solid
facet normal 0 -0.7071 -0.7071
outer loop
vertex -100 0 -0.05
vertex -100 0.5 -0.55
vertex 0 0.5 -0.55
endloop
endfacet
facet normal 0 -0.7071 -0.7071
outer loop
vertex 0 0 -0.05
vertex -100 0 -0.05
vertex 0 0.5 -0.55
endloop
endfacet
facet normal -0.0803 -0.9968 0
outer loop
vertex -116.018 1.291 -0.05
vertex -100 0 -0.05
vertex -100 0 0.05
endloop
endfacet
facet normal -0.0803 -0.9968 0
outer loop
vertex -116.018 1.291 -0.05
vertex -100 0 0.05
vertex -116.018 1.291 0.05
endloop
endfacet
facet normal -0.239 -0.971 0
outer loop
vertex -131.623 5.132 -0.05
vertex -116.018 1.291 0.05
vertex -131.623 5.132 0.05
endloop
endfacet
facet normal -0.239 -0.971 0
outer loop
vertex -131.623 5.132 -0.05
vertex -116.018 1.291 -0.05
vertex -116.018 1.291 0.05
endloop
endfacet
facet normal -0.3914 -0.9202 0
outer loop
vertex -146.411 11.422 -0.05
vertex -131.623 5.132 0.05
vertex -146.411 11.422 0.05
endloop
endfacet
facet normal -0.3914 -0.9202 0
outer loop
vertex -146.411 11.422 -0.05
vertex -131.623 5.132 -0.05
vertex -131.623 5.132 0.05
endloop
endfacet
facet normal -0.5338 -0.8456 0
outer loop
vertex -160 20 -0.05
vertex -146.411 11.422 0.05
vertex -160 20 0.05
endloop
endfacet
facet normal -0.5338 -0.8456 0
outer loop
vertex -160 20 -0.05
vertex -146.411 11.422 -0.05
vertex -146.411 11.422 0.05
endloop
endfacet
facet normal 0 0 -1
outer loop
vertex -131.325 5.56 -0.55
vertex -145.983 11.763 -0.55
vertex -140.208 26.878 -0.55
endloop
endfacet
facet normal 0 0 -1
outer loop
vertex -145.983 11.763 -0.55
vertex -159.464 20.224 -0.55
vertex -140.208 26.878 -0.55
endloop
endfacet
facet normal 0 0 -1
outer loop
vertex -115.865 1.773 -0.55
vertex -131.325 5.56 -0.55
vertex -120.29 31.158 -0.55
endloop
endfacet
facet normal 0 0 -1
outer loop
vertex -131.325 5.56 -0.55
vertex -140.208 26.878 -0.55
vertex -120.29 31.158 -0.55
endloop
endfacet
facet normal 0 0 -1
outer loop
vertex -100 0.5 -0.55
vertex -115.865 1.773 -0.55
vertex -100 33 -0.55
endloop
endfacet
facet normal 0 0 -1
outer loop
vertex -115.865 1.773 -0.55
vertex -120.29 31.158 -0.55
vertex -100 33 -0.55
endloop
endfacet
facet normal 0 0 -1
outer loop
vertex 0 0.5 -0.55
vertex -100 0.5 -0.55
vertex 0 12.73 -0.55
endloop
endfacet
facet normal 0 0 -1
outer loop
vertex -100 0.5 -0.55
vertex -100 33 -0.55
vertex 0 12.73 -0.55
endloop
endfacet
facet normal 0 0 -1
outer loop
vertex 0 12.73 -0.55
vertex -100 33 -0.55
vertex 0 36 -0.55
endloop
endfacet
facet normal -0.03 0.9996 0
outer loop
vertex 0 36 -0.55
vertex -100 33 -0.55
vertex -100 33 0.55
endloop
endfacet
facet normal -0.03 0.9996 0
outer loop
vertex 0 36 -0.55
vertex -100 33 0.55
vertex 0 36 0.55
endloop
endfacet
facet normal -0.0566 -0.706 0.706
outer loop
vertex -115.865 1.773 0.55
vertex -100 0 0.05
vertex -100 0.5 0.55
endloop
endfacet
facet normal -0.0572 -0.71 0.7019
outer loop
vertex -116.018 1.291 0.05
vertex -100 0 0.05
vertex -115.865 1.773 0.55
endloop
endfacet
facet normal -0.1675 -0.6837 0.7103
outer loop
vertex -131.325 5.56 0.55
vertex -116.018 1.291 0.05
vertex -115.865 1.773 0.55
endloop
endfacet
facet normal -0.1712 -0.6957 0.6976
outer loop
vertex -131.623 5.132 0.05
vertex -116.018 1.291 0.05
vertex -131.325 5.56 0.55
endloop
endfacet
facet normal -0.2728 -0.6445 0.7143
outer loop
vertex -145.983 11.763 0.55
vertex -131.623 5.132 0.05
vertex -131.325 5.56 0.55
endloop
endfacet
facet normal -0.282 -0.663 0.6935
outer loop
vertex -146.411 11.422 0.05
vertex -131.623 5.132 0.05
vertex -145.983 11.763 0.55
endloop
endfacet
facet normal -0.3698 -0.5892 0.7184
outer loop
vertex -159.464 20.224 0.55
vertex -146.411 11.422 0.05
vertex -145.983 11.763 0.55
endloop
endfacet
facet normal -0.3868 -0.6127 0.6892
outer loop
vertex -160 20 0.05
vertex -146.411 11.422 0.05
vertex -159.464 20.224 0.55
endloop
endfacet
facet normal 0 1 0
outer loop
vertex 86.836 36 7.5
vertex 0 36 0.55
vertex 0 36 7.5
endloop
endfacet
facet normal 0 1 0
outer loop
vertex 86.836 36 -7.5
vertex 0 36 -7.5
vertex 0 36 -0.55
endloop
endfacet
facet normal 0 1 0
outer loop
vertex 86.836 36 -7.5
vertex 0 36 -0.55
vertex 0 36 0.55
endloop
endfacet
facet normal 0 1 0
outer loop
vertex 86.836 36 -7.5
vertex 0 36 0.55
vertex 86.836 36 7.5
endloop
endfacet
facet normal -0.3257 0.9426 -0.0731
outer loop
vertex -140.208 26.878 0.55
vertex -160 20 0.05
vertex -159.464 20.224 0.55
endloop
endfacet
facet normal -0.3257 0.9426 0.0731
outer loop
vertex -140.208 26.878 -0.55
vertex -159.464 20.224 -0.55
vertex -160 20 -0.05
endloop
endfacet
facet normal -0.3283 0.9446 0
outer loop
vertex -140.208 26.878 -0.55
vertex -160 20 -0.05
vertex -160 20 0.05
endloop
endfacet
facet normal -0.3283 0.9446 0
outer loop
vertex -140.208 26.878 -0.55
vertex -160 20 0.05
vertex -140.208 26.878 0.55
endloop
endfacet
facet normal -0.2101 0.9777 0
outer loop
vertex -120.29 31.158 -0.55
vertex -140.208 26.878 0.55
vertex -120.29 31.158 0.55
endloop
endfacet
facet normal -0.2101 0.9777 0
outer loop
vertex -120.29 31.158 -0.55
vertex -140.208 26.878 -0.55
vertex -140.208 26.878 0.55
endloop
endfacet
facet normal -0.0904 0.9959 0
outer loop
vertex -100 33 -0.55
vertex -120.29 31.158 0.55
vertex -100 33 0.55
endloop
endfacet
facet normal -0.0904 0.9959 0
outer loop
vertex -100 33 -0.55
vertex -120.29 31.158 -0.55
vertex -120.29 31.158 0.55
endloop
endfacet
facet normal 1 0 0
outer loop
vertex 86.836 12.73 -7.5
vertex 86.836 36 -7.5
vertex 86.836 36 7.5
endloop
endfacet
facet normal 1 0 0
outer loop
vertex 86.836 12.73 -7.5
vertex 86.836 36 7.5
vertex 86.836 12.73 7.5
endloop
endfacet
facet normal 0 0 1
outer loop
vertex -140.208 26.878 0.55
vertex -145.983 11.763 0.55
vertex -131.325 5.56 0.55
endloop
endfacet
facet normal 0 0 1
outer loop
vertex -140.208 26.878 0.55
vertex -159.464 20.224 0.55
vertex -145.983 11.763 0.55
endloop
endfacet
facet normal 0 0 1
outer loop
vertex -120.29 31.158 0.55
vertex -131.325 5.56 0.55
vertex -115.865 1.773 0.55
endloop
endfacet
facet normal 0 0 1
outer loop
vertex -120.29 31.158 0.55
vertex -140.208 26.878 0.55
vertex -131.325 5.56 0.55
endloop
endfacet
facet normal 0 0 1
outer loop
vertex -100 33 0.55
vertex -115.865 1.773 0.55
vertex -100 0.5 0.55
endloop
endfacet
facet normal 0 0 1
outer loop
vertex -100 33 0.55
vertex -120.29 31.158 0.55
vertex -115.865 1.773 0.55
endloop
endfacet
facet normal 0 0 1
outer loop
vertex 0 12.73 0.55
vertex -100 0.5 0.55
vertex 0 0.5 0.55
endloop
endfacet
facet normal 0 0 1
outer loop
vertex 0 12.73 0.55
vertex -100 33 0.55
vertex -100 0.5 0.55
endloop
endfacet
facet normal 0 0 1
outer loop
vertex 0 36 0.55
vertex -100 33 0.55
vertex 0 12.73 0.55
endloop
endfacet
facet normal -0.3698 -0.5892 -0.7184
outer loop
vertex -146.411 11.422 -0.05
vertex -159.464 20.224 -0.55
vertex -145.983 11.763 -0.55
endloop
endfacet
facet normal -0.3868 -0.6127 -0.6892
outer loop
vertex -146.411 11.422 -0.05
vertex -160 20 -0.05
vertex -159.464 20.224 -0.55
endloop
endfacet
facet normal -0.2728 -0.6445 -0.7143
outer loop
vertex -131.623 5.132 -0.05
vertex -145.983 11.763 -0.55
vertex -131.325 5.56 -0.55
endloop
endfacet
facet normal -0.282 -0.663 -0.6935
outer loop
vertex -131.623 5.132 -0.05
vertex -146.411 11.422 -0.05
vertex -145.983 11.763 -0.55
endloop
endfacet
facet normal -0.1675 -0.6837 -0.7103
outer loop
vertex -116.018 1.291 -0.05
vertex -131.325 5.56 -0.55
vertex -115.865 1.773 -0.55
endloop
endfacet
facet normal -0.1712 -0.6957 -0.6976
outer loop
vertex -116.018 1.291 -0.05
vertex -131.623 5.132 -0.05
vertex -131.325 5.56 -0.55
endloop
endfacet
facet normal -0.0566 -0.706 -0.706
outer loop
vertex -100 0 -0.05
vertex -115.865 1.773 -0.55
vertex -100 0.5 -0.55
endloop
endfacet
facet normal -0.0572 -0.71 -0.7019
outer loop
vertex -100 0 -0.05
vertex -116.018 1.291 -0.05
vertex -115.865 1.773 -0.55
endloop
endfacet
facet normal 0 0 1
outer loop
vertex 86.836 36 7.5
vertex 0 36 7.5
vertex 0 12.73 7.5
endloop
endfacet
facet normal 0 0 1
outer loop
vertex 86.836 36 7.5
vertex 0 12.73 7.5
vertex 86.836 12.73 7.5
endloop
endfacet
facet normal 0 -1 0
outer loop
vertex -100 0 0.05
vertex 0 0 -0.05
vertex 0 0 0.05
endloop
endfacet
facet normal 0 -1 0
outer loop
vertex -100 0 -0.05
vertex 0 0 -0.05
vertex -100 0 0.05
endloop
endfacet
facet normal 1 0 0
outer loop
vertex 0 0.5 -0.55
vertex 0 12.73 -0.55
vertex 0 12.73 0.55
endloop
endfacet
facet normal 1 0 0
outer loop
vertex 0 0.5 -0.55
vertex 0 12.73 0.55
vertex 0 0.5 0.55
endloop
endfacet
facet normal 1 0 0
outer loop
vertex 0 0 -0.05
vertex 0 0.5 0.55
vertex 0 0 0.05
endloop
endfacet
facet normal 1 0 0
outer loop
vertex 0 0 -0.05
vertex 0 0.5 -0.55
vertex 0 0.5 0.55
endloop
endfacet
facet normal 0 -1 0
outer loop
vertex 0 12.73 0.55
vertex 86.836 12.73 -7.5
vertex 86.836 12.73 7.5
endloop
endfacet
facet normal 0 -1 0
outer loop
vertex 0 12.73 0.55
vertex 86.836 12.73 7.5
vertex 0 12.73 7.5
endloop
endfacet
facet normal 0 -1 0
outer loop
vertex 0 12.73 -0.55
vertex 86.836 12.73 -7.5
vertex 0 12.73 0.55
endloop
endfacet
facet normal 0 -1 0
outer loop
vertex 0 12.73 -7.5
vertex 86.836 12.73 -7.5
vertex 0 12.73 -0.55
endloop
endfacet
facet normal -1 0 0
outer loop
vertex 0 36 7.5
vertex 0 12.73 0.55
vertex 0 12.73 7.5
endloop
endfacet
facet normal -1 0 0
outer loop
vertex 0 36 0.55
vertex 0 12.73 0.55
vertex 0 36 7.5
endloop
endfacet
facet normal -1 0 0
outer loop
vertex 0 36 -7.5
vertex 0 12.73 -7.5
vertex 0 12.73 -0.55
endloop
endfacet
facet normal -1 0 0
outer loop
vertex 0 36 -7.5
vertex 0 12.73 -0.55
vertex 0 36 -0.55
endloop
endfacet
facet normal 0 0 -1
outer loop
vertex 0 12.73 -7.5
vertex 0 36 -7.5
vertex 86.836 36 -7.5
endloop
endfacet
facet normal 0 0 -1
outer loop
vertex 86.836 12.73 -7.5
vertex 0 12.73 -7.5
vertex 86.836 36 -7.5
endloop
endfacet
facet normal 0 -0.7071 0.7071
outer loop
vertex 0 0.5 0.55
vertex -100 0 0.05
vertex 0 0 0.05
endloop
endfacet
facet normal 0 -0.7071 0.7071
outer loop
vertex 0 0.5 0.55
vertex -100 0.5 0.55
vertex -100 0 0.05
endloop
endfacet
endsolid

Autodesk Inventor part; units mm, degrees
ref_plane "YZ Plane" through (0, 0, 0) normal (1, 0, 0) x (0, 1, 0)
ref_plane "XZ Plane" through (0, 0, 0) normal (0, 1, 0) x (-1, 0, 0)
ref_plane "XY Plane" through (0, 0, 0) normal (0, 0, 1) x (1, 0, 0)
sketch "Sketch1" plane through (0, 0, 0) normal (0, 0, 1) x (1, 0, 0)
  line L0 (0, 0) -> (-100, 0)
  line L1 (-100, 0) -> (-100, 33) construction
  line L2 (-100, 33) -> (0, 36)
  line L3 (0, 36) -> (0, 0)
  arc A0 (-160, 20) -> (-100, 0) centre (-100, 100) ccw
  arc A1 (-100, 33) -> (-160, 20) centre (-94.9522, -135.2589) ccw
  dimension "d0" = 100
  dimension "d2" = 36
  dimension "d10" = 60
  dimension "d11" = 20
  dimension "d12" = 33
extrude "Extrusion1" add sketch "Sketch1" along normal mid plane 1.1
sketch "Sketch2" plane through (0, 0, 0) normal (0, 0, 1) x (1, 0, 0)
  line L0 (0, 36) -> (-160.3357, 31.1899) projected
  line L1 (0, 36) -> (86.8358, 36)
  line L2 (86.8358, 36) -> (86.8358, 12.7298)
  line L3 (86.8358, 12.7298) -> (0, 12.7298)
  line L4 (0, 12.7298) -> (0, 36)
  point P0 (0, 0)
  point P1 (-160, 20)
extrude "Extrusion2" add sketch "Sketch2" along normal mid plane 15
chamfer "Chamfer1" distance 0.5 angle 45 4 edges at (-50, 0, 0.55) (-131.6228, 5.1317, 0.55) (-50, 0, -0.55) (-131.6228, 5.1317, -0.55)
properties part number "Knife"
